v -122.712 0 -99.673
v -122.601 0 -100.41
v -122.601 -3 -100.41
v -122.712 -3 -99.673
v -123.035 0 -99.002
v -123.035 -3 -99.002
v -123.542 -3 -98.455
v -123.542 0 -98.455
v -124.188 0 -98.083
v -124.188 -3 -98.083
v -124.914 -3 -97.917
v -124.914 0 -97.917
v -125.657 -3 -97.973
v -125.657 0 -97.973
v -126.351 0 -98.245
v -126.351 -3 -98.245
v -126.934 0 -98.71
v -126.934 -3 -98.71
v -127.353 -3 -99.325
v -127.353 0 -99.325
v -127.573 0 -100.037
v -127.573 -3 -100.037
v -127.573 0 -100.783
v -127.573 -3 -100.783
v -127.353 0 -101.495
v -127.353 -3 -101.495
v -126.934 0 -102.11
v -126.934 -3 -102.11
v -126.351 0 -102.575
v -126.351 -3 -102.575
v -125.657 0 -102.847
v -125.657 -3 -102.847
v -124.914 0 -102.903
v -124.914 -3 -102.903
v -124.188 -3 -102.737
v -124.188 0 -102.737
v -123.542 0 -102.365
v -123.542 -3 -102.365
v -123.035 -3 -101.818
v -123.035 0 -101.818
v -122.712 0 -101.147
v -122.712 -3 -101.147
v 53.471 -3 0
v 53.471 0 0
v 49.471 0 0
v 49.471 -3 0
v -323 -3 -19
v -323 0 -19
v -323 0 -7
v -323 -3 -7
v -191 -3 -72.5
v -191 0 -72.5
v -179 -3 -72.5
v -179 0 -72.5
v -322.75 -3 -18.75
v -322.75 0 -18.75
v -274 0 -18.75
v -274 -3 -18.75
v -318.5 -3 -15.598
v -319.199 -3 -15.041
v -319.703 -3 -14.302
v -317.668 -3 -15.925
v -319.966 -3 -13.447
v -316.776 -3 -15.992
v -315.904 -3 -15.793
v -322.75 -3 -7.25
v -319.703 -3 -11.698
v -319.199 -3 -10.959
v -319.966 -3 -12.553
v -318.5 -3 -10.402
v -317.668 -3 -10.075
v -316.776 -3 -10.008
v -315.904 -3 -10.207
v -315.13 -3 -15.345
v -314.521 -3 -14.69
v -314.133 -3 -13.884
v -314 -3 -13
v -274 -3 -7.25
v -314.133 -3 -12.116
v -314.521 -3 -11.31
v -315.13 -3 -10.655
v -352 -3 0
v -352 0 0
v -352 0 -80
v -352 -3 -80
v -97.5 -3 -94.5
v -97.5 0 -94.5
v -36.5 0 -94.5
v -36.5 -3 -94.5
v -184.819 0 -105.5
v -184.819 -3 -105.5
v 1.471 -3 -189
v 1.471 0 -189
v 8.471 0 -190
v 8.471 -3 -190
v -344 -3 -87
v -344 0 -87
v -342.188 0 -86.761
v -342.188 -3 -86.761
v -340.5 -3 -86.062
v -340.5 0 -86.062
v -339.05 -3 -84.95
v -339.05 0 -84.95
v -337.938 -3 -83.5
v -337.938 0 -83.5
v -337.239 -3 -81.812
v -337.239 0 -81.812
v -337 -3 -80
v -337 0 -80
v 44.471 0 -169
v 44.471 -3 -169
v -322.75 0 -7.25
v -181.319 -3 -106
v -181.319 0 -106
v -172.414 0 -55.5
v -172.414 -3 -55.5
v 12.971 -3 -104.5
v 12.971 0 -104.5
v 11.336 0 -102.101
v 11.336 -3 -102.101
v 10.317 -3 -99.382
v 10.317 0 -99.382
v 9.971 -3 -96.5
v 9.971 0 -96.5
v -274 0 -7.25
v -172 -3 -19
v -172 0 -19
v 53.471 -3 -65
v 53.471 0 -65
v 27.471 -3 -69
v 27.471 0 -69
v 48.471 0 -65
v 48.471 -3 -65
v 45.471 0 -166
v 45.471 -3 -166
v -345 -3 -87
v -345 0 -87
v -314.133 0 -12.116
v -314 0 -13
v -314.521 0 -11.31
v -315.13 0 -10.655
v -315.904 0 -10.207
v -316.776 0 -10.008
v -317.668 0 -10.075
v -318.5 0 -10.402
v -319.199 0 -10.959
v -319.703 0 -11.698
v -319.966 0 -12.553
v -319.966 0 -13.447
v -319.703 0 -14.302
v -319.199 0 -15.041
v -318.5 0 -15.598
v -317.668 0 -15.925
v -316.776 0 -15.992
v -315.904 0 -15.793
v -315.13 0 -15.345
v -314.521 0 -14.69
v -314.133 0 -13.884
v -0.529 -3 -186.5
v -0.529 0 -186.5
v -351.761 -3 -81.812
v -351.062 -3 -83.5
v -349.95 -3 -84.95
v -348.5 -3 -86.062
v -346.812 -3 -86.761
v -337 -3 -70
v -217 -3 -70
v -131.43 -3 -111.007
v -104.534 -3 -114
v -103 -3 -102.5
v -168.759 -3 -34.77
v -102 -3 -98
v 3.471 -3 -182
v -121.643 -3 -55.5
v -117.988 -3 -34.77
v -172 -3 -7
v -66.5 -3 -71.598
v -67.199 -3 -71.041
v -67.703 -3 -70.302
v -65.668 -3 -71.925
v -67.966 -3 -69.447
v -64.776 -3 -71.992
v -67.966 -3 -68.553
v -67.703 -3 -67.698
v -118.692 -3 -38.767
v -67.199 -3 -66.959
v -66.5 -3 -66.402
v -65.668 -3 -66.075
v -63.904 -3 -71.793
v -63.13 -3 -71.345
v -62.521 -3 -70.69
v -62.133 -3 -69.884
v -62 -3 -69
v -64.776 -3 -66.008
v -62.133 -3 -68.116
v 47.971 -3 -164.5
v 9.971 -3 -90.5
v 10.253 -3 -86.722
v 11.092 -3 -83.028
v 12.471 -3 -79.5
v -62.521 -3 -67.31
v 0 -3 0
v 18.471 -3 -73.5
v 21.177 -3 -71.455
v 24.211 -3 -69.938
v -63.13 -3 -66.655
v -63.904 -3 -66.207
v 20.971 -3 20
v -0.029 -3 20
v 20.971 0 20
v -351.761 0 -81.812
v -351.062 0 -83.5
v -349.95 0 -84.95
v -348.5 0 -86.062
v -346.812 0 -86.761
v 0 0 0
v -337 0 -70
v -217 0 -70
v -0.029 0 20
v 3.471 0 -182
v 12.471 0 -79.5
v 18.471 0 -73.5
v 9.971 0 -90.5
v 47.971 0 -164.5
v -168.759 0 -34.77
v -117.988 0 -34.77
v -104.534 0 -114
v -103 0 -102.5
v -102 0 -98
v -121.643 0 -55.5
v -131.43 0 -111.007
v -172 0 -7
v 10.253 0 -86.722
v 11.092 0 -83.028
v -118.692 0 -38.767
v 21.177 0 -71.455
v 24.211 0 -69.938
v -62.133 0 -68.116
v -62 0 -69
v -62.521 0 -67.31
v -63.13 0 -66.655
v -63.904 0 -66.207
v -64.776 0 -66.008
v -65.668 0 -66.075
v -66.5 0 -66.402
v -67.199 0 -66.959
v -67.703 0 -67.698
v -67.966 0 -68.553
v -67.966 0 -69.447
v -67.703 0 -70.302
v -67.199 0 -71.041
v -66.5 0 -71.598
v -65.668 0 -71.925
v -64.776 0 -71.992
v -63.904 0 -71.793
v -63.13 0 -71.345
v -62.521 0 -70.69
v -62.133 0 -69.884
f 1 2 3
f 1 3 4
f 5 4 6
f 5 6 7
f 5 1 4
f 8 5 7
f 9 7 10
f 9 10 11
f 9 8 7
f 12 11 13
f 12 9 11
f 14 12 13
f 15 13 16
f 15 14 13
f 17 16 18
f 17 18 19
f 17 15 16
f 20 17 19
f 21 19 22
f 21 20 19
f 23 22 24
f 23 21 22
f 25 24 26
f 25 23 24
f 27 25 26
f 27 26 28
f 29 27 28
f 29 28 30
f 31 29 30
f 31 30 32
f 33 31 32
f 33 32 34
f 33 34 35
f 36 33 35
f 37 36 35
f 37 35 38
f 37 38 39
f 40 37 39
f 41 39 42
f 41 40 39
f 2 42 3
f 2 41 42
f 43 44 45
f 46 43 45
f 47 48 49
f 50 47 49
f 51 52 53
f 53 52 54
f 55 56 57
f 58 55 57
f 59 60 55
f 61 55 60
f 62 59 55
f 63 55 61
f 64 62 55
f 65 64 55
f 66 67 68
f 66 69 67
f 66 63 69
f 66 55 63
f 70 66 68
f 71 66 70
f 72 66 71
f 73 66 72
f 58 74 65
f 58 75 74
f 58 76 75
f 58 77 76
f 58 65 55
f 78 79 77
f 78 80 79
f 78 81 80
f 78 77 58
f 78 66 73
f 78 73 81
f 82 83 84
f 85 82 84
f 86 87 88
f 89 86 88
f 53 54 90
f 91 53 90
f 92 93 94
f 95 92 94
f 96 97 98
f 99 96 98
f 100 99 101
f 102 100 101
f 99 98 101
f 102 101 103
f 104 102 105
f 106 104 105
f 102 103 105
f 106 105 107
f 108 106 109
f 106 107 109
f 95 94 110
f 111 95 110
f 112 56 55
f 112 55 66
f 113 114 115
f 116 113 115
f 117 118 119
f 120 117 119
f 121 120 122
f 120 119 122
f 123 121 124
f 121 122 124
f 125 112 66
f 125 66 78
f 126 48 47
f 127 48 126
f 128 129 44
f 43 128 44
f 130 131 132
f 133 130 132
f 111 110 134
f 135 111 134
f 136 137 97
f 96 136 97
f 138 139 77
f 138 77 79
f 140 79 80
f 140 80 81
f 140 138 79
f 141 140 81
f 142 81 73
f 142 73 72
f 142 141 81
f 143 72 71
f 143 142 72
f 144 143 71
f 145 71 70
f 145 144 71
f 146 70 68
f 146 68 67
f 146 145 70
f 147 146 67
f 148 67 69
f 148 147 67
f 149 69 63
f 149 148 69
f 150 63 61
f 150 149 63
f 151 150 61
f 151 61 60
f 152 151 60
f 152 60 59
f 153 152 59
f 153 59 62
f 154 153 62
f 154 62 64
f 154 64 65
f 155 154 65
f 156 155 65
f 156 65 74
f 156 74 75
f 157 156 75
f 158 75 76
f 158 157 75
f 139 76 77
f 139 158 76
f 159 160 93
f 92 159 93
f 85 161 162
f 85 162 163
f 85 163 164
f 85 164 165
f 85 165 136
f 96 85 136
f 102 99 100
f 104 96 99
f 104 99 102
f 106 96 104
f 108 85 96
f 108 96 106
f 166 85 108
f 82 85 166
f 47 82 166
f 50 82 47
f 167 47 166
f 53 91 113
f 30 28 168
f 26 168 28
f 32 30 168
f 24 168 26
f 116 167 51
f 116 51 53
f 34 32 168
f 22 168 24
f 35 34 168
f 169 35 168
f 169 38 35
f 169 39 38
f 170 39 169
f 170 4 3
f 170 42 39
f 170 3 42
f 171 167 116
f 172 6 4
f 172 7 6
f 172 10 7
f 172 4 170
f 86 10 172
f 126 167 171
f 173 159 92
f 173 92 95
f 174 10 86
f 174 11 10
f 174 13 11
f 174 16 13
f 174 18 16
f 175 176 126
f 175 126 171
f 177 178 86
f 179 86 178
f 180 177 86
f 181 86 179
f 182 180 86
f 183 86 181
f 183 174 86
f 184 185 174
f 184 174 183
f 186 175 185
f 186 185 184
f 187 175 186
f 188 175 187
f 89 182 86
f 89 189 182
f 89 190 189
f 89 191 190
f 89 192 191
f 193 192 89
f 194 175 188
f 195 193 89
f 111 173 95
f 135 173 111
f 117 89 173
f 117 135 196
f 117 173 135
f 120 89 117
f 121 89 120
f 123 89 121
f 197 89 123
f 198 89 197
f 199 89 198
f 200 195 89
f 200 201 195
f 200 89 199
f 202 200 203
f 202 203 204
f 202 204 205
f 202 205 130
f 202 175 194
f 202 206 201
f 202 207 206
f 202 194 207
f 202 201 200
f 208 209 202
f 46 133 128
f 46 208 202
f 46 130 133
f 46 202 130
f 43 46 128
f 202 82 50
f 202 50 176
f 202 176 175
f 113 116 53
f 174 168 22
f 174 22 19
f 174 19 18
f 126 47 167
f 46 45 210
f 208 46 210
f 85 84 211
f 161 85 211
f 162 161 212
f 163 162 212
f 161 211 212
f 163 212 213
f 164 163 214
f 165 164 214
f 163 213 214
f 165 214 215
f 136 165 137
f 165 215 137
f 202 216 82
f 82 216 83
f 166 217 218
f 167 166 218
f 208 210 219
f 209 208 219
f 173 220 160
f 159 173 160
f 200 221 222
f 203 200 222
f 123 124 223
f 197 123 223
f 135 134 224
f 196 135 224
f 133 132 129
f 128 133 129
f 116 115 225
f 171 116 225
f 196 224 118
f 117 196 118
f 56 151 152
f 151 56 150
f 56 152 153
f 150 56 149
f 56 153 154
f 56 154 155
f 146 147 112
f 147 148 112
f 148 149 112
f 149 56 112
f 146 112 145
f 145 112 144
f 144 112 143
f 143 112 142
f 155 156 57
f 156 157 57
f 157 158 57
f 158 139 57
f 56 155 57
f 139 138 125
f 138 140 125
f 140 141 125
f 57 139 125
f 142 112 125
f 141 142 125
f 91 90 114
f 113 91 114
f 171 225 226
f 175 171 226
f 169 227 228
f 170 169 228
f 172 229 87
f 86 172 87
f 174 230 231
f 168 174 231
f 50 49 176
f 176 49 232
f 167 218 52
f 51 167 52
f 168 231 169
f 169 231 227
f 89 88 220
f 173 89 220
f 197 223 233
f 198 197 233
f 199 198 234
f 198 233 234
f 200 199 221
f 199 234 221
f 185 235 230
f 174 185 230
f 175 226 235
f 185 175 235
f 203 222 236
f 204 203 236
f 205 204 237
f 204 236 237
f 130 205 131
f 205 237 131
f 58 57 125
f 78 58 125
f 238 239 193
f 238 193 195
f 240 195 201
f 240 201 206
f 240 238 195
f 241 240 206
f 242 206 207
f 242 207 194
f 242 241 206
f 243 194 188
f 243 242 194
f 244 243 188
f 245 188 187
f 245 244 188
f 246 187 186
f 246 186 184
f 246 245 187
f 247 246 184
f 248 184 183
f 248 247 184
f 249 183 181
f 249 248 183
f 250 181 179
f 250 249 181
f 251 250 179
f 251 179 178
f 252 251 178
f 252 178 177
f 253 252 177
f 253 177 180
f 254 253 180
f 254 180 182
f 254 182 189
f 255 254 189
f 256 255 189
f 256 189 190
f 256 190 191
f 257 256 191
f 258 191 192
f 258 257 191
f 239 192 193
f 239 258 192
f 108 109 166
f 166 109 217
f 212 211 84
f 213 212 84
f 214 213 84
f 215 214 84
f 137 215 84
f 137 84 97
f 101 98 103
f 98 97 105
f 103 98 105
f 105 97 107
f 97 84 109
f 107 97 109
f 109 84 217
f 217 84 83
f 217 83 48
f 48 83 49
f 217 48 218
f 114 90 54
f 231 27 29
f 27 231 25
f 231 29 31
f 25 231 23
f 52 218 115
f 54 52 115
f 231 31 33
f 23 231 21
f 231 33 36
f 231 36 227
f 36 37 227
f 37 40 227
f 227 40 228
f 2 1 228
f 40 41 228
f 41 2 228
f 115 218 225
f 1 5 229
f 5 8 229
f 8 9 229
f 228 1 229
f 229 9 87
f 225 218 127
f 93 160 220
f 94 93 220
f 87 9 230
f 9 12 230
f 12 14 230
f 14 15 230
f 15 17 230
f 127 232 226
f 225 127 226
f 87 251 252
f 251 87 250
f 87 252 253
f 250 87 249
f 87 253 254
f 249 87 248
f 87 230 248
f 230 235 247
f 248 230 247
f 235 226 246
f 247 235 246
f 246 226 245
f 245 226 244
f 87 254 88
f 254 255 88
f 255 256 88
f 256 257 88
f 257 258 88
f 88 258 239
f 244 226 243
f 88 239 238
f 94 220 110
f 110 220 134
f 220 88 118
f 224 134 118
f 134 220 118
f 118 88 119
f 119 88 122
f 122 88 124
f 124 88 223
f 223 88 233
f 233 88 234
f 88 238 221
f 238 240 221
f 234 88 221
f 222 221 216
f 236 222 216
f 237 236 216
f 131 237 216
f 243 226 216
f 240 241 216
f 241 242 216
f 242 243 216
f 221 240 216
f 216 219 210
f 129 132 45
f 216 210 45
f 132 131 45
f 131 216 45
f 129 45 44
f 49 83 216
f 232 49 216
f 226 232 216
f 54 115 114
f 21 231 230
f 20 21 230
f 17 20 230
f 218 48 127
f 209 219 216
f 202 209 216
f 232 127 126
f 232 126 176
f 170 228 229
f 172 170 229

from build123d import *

# Parameters (mm, degrees)
F0_R     = 2.5
F0_W     = 151
F0_H     = 12
F0_R_2   = 3
F1_DEPTH = 3
F0_W_2   = 48.75
F0_H_2   = 11.5


# Not quite as in the source:
# - a feature names something its author has since deleted; it is built from what else it names


with BuildPart() as f1:
    # F0 (on Front) → F1 (new body)
    with BuildSketch(Plane.XZ):
        with BuildLine():
            Line((48.4706909373, -65), (53.4706909373, -65))
            Line((53.4706909373, -65), (53.4706909373, 0))
            Line((53.4706909373, 0), (49.4706909373, 0))
            Line((49.4706909373, 0), (20.9706909373, 19.9999785245))
            Line((20.9706909373, 19.9999785245), (-0.0293090627, 19.9999785245))
            Line((-0.0293090627, 19.9999785245), (0, 0))
            Line((0, 0), (-352, 0))
            Line((-352, 0), (-352, -39))
            Line((-352, -39), (-352, -55.5))
            Line((-352, -55.5), (-352, -80))
            ThreePointArc((-352, -80), (-349.9497474683, -84.9497474683), (-345, -87))
            Line((-345, -87), (-344, -87))
            ThreePointArc((-344, -87), (-339.0502525317, -84.9497474683), (-337, -80))
            Line((-337, -80), (-337, -70))
            Line((-337, -70), (-217, -70))
            Line((-217, -70), (-191, -72.5))
            Line((-191, -72.5), (-179, -72.5))
            Line((-179, -72.5), (-184.8187903634, -105.5))
            Line((-184.8187903634, -105.5), (-181.3187903634, -106))
            Line((-181.3187903634, -106), (-172.4142778376, -55.5))
            Line((-172.4142778376, -55.5), (-168.7590112311, -34.7699529486))
            Line((-168.7590112311, -34.7699529486), (-117.9876806368, -34.7699529486))
            Line((-117.9876806368, -34.7699529486), (-118.692445624, -38.7668738074))
            Line((-118.692445624, -38.7668738074), (-121.6429472433, -55.5))
            Line((-121.6429472433, -55.5), (-131.4303426842, -111.007077825))
            Line((-131.4303426842, -111.007077825), (-104.5337054221, -114))
            Line((-104.5337054221, -114), (-103, -102.5))
            Line((-103, -102.5), (-102, -98))
            Line((-102, -98), (-97.5, -94.5))
            Line((-97.5, -94.5), (-36.5, -94.5))
            Line((-36.5, -94.5), (3.4706909373, -182))
            Line((3.4706909373, -182), (-0.5293090627, -186.5))
            Line((-0.5293090627, -186.5), (1.4706909373, -189))
            Line((1.4706909373, -189), (8.4706909373, -190))
            Line((8.4706909373, -190), (44.4706909373, -169))
            Line((44.4706909373, -169), (45.4706909373, -166))
            Line((45.4706909373, -166), (47.9706909373, -164.5))
            Line((47.9706909373, -164.5), (12.9706909373, -104.5))
            ThreePointArc((12.9706909373, -104.5), (10.7453526102, -100.7720018727), (9.9706909373, -96.5))
            Line((9.9706909373, -96.5), (9.9706909373, -90.5))
            ThreePointArc((9.9706909373, -90.5), (10.6035597574, -84.8597429137), (12.4706909373, -79.5))
            Line((12.4706909373, -79.5), (18.4706909373, -73.5))
            ThreePointArc((18.4706909373, -73.5), (22.6588628123, -70.6263437501), (27.4706909373, -69))
            Line((27.4706909373, -69), (48.4706909373, -65))
        make_face()
        with Locations((-125.101, -100.41)):
            Circle(F0_R, mode=Mode.SUBTRACT)
        with Locations((-247.5, -13)):
            Rectangle(F0_W, F0_H, mode=Mode.SUBTRACT)
        with Locations((-65, -69)):
            Circle(F0_R_2, mode=Mode.SUBTRACT)
    extrude(amount=F1_DEPTH)


with BuildPart() as f1b:
    # F0 (on Front) → F1, piece 2 (new body)
    with BuildSketch(Plane.XZ):
        with Locations((-298.375, -13)):
            Rectangle(F0_W_2, F0_H_2)
        with Locations((-317, -13)):
            Circle(F0_R_2, mode=Mode.SUBTRACT)
    extrude(amount=F1_DEPTH)


solid = Compound([f1.part, f1b.part])
